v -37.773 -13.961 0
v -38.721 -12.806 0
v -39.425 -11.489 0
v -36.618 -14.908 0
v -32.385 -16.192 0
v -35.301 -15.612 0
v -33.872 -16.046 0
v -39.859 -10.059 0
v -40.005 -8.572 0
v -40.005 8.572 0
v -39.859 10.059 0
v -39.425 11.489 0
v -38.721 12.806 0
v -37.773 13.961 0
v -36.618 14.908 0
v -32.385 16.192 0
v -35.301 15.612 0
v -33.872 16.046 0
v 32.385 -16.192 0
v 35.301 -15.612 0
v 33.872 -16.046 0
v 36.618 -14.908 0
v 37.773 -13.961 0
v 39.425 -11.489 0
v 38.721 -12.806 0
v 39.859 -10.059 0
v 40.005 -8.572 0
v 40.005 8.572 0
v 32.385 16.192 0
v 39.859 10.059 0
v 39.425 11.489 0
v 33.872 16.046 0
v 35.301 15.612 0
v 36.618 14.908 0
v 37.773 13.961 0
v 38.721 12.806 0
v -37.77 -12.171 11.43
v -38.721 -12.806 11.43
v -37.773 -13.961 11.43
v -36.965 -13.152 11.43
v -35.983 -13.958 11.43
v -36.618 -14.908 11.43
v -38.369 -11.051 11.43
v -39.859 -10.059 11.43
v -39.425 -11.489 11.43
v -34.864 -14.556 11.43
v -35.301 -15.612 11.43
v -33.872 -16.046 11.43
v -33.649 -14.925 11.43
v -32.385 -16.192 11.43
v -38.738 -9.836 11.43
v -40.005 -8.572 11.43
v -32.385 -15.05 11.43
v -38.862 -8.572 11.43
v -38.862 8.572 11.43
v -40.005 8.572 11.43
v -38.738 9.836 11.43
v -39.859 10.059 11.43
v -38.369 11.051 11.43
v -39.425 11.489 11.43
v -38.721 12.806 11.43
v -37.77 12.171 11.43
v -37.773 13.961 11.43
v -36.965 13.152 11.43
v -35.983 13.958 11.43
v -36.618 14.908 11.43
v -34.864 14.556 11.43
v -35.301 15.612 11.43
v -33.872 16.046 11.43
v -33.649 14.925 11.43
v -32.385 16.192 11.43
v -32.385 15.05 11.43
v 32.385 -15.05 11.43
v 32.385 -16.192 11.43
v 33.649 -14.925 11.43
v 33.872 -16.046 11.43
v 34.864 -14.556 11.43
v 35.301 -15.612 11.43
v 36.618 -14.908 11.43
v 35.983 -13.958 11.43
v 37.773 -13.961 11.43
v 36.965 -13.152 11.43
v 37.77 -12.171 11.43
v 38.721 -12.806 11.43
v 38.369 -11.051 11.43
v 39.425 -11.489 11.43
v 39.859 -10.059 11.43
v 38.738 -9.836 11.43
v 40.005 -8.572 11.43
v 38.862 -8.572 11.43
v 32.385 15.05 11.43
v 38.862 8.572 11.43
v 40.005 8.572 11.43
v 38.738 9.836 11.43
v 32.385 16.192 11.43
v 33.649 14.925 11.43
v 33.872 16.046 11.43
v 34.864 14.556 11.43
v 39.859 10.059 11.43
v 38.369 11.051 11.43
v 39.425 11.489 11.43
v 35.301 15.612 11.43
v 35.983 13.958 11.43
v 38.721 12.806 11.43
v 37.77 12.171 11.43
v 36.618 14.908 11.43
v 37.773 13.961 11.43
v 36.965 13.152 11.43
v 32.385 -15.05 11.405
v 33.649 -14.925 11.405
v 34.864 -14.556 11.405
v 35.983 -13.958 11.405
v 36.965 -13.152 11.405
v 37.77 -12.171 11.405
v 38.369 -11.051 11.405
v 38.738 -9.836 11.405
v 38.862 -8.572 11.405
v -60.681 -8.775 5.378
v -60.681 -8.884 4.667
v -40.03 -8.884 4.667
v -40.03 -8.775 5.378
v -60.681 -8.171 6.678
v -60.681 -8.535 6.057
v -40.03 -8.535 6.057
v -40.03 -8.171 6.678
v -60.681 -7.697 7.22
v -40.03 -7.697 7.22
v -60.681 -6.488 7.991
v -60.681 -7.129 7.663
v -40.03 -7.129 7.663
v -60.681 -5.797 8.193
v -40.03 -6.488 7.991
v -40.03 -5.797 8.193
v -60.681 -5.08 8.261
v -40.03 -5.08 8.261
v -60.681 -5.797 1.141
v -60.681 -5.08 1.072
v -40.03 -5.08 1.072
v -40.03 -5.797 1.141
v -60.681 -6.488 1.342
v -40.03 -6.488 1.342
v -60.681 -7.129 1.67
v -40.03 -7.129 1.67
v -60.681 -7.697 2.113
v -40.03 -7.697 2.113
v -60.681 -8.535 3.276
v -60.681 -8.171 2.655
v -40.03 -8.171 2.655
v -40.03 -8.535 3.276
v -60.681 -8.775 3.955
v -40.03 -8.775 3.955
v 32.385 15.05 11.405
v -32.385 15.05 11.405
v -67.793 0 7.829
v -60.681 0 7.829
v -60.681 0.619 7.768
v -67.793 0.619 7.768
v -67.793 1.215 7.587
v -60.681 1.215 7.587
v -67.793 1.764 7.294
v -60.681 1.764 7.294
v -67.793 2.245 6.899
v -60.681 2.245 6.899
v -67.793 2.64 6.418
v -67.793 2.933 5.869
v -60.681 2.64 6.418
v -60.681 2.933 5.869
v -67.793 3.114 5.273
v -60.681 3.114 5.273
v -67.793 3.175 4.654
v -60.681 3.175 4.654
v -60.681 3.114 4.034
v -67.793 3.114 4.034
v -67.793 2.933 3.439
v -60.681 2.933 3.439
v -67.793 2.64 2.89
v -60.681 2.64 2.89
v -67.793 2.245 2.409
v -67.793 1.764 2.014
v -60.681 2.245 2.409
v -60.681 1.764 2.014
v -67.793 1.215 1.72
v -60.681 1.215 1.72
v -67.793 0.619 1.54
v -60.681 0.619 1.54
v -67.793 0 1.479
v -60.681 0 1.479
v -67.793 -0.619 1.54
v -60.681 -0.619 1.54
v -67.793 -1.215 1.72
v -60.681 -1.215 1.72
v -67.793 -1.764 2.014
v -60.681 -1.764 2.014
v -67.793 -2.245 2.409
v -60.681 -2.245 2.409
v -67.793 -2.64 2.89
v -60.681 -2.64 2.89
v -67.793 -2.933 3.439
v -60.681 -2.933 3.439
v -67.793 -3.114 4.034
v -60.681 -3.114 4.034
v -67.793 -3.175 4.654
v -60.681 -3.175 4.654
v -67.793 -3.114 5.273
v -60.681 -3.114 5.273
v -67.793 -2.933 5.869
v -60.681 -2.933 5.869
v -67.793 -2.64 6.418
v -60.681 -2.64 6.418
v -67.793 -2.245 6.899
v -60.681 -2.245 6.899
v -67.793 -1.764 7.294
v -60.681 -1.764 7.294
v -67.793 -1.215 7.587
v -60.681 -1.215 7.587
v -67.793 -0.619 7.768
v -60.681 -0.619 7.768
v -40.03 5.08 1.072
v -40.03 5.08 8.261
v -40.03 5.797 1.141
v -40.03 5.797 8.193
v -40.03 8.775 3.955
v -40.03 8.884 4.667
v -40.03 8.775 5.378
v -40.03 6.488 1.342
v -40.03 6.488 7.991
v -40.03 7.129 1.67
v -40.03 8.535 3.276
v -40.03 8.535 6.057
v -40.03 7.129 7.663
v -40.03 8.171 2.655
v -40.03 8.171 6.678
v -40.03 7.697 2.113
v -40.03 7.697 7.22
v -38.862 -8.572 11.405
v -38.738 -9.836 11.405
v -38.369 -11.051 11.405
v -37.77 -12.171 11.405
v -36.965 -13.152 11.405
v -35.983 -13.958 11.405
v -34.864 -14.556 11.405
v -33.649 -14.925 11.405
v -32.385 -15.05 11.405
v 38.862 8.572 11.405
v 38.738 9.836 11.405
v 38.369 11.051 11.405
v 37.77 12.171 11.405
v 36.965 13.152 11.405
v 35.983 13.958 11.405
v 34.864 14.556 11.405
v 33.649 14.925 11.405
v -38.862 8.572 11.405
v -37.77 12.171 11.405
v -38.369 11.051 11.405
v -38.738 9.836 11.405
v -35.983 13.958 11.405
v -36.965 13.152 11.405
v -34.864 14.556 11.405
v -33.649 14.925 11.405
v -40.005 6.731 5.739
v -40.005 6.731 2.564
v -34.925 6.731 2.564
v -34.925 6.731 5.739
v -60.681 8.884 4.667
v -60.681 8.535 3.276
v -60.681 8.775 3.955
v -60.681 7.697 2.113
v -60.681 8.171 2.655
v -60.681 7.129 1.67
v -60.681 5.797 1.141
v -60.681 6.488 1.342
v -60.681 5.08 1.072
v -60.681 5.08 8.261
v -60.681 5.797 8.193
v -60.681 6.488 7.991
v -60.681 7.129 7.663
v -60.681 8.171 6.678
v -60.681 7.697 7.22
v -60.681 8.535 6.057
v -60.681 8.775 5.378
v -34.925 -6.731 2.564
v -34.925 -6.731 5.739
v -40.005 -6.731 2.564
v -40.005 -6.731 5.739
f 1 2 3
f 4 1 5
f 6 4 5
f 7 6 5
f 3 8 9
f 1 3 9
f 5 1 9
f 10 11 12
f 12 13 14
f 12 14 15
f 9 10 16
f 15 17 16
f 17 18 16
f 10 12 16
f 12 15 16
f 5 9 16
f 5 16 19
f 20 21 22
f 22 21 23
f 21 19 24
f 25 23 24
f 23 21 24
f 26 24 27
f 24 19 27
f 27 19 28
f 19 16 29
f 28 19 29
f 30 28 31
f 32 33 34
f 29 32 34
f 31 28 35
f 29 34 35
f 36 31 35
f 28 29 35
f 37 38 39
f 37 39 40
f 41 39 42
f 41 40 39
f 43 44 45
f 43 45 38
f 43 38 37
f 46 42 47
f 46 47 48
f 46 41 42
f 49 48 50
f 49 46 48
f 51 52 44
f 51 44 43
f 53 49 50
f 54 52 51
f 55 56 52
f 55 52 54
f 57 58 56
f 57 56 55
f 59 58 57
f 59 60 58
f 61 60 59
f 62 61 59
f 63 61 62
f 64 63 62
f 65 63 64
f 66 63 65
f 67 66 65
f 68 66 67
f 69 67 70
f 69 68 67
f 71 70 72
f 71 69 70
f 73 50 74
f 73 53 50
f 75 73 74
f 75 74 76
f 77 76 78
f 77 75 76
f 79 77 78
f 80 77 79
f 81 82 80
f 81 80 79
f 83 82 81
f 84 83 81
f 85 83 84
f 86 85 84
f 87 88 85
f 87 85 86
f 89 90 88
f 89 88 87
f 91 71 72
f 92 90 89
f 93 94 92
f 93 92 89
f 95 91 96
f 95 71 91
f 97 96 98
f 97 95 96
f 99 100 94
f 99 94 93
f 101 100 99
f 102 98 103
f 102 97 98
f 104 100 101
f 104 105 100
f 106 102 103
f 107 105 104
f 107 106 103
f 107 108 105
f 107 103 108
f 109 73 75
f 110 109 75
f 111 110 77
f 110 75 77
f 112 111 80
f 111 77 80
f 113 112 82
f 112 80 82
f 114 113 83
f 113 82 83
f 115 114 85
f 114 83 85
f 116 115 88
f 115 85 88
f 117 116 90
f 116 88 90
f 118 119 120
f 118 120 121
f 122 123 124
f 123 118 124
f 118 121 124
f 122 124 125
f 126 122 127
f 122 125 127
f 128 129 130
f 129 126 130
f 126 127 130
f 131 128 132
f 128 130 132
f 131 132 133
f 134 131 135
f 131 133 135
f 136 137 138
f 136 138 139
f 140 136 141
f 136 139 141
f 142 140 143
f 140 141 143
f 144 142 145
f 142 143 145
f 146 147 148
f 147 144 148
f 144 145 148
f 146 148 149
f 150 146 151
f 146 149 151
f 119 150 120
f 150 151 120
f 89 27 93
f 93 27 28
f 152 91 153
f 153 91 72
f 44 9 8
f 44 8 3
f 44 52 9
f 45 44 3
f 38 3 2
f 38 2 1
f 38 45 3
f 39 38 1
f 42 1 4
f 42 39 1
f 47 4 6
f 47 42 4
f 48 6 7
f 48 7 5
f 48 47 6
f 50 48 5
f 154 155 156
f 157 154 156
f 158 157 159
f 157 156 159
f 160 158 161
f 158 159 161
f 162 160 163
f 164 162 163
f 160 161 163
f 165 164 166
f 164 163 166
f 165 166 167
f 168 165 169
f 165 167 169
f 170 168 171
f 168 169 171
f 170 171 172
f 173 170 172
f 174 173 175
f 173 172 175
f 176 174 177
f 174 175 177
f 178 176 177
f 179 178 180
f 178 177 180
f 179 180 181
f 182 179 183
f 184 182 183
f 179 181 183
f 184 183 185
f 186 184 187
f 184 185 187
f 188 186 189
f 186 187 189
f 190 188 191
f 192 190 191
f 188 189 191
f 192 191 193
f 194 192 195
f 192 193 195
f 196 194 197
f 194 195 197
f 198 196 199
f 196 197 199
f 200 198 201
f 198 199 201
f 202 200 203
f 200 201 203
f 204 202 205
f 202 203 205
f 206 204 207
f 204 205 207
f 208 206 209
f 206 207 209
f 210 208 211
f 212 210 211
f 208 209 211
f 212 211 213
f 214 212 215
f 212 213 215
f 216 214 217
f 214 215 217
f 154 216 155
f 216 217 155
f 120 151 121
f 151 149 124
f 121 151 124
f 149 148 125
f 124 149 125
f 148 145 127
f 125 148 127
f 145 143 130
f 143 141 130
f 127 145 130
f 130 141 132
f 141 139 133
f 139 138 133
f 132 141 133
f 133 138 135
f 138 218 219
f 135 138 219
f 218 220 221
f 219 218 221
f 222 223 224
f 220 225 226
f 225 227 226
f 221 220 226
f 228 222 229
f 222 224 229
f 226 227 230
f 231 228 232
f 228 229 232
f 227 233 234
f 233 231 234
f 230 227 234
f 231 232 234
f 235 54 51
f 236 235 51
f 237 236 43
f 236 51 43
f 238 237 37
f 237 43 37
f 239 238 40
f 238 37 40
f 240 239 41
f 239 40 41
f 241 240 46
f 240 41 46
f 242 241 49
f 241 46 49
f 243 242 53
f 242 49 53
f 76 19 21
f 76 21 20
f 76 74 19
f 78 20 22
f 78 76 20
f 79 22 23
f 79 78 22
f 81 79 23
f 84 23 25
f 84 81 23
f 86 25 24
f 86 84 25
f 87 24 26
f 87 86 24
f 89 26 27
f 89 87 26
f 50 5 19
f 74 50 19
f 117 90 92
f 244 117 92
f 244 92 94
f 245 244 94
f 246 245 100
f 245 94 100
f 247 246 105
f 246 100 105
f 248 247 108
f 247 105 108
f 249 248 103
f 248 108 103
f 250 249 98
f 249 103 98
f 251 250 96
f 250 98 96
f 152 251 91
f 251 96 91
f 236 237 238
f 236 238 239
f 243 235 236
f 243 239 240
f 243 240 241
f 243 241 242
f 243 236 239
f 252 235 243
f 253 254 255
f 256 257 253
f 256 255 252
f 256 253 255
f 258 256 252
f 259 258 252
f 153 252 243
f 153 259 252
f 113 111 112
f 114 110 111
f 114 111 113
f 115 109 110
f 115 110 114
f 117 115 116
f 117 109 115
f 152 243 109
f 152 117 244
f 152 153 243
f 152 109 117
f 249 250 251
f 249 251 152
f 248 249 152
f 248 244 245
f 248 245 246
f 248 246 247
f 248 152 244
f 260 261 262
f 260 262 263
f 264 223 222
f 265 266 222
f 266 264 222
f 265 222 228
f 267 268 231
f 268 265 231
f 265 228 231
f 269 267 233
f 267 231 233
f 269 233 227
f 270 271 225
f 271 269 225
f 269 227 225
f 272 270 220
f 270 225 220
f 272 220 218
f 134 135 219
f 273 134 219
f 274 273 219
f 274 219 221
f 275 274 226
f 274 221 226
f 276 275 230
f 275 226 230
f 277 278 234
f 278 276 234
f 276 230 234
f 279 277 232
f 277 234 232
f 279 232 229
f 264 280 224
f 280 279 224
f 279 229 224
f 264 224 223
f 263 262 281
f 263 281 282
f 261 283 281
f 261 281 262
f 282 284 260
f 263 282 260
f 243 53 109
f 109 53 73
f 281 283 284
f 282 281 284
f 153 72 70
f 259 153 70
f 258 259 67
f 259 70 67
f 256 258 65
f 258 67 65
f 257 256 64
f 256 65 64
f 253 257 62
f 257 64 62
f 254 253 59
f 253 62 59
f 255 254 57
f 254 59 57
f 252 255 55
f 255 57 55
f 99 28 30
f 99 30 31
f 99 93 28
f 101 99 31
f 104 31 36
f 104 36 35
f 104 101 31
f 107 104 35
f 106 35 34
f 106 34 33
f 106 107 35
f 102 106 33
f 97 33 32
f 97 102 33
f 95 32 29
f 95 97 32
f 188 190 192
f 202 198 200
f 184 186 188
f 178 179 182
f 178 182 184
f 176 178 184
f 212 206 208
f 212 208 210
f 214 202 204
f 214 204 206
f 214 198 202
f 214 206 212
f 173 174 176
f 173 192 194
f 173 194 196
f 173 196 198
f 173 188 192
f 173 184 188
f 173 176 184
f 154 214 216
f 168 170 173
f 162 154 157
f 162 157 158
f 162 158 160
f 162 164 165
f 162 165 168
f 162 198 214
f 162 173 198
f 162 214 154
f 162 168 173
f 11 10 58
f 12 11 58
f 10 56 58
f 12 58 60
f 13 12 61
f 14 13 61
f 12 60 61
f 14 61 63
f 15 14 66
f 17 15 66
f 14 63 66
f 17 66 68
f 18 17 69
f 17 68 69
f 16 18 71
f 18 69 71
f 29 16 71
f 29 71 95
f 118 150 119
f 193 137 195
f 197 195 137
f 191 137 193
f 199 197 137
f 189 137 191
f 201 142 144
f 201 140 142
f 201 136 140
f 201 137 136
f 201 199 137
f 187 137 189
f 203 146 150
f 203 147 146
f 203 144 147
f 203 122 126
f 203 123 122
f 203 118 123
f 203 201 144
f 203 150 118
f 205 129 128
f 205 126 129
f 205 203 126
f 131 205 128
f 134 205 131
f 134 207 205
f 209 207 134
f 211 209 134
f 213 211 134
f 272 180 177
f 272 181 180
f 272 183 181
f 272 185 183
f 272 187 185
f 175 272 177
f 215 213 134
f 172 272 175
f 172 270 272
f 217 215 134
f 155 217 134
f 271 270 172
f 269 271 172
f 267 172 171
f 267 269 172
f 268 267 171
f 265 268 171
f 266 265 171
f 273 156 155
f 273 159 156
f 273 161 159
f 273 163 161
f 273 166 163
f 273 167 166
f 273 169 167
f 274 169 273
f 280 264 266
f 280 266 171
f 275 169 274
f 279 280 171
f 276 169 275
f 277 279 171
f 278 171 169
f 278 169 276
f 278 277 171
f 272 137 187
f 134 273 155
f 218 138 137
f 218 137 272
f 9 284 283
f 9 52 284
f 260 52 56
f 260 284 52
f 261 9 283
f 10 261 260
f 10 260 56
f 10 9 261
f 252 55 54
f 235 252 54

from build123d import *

# Parameters (mm, degrees)
SKETCH2_W           = 80.01
SKETCH2_H           = 32.385
BOSS_EXTRUDE1_DEPTH = 11.43
FILLET1_R           = 7.62
CUT_EXTRUDE1_DEPTH  = 0.0254
SKETCH5_W           = 3.175
SKETCH5_H           = 13.462
CUT_EXTRUDE2_DEPTH  = 5.08
BOSS_EXTRUDE2_START = 0.0254
SKETCH6_W           = 7.1882
SKETCH6_H           = 17.78
BOSS_EXTRUDE2_DEPTH = 20.6502
FILLET2_R           = 3.81
SKETCH7_R           = 3.175
BOSS_EXTRUDE3_DEPTH = 7.112


with BuildPart() as part:
    # Sketch2 → Boss-Extrude1 (new body)
    with BuildSketch(Plane.XY):
        Rectangle(SKETCH2_W, SKETCH2_H)
    extrude(amount=BOSS_EXTRUDE1_DEPTH)

    # Fillet1
    fillet1_edges = [part.edges().sort_by_distance(p)[0] for p in [
        (-40.005, 16.1925, 5.715),
        (40.005, 16.1925, 5.715),
        (40.005, -16.1925, 5.715),
        (-40.005, -16.1925, 5.715),
    ]]
    fillet(fillet1_edges, radius=FILLET1_R)

    # Sketch4 → Cut-Extrude1 (cut)
    with BuildSketch(Plane.XY.offset(11.43)):
        with BuildLine():
            Line((-38.862, 8.5725), (-38.862, -8.5725))
            ThreePointArc((-38.862, -8.5725), (-36.964930622, -13.152430622), (-32.385, -15.0495))
            Line((-32.385, -15.0495), (32.385, -15.0495))
            ThreePointArc((32.385, -15.0495), (36.964930622, -13.152430622), (38.862, -8.5725))
            Line((38.862, -8.5725), (38.862, 8.5725))
            ThreePointArc((38.862, 8.5725), (36.964930622, 13.152430622), (32.385, 15.0495))
            Line((32.385, 15.0495), (-32.385, 15.0495))
            ThreePointArc((-32.385, 15.0495), (-36.964930622, 13.152430622), (-38.862, 8.5725))
        make_face()
    extrude(amount=-CUT_EXTRUDE1_DEPTH, mode=Mode.SUBTRACT)

    # Sketch5 → Cut-Extrude2 (cut)
    with BuildSketch(Plane.ZY.offset(40.005)):
        with Locations((4.151118715, 0)):
            Rectangle(SKETCH5_W, SKETCH5_H)
    extrude(amount=-CUT_EXTRUDE2_DEPTH, mode=Mode.SUBTRACT)


with BuildPart() as body_2:
    # Sketch6 → Boss-Extrude2 (new body)
    with BuildSketch(Plane.ZY.offset(40.005).offset(BOSS_EXTRUDE2_START)):
        with Locations((4.666570246, 0)):
            Rectangle(SKETCH6_W, SKETCH6_H)
    extrude(amount=BOSS_EXTRUDE2_DEPTH)

    # Fillet2
    # the kernel refuses this fillet: 3.81 mm, written as the material it takes off along each edge
    with BuildSketch(Plane(origin=(-30.5054, -8.89, 1.072470246), x_dir=(0, 0, 1), z_dir=(-1, 0, 0)), Plane(origin=(-30.5054, -8.89, 8.260670246), x_dir=(0, 1, 0), z_dir=(-1, 0, 0)), Plane(origin=(-30.5054, 8.89, 8.260670246), x_dir=(0, 0, -1), z_dir=(-1, 0, 0))) as fillet2_piece_1:
        with BuildLine():
            CenterArc((FILLET2_R, FILLET2_R), FILLET2_R, 180, 90)
            Line((0, FILLET2_R), (0, 0))
            Line((0, 0), (FILLET2_R, 0))
        make_face()
    extrude(amount=39.7002, mode=Mode.SUBTRACT)
    with BuildSketch(Plane(origin=(-30.5054, 8.89, 1.072470246), x_dir=(0, 0, 1), z_dir=(-1, 0, 0))) as fillet2_piece_2:
        with BuildLine():
            CenterArc((FILLET2_R, -FILLET2_R), FILLET2_R, 90, 90)
            Line((0, -FILLET2_R), (0, 0))
            Line((0, 0), (FILLET2_R, 0))
        make_face()
    extrude(amount=39.7002, mode=Mode.SUBTRACT)

    # Sketch7 → Boss-Extrude3 (add)
    with BuildSketch(Plane.ZY.offset(60.6806)):
        with Locations((4.653668075, 0)):
            Circle(SKETCH7_R)
    extrude(amount=BOSS_EXTRUDE3_DEPTH)


solid = Compound([part.part, body_2.part])
